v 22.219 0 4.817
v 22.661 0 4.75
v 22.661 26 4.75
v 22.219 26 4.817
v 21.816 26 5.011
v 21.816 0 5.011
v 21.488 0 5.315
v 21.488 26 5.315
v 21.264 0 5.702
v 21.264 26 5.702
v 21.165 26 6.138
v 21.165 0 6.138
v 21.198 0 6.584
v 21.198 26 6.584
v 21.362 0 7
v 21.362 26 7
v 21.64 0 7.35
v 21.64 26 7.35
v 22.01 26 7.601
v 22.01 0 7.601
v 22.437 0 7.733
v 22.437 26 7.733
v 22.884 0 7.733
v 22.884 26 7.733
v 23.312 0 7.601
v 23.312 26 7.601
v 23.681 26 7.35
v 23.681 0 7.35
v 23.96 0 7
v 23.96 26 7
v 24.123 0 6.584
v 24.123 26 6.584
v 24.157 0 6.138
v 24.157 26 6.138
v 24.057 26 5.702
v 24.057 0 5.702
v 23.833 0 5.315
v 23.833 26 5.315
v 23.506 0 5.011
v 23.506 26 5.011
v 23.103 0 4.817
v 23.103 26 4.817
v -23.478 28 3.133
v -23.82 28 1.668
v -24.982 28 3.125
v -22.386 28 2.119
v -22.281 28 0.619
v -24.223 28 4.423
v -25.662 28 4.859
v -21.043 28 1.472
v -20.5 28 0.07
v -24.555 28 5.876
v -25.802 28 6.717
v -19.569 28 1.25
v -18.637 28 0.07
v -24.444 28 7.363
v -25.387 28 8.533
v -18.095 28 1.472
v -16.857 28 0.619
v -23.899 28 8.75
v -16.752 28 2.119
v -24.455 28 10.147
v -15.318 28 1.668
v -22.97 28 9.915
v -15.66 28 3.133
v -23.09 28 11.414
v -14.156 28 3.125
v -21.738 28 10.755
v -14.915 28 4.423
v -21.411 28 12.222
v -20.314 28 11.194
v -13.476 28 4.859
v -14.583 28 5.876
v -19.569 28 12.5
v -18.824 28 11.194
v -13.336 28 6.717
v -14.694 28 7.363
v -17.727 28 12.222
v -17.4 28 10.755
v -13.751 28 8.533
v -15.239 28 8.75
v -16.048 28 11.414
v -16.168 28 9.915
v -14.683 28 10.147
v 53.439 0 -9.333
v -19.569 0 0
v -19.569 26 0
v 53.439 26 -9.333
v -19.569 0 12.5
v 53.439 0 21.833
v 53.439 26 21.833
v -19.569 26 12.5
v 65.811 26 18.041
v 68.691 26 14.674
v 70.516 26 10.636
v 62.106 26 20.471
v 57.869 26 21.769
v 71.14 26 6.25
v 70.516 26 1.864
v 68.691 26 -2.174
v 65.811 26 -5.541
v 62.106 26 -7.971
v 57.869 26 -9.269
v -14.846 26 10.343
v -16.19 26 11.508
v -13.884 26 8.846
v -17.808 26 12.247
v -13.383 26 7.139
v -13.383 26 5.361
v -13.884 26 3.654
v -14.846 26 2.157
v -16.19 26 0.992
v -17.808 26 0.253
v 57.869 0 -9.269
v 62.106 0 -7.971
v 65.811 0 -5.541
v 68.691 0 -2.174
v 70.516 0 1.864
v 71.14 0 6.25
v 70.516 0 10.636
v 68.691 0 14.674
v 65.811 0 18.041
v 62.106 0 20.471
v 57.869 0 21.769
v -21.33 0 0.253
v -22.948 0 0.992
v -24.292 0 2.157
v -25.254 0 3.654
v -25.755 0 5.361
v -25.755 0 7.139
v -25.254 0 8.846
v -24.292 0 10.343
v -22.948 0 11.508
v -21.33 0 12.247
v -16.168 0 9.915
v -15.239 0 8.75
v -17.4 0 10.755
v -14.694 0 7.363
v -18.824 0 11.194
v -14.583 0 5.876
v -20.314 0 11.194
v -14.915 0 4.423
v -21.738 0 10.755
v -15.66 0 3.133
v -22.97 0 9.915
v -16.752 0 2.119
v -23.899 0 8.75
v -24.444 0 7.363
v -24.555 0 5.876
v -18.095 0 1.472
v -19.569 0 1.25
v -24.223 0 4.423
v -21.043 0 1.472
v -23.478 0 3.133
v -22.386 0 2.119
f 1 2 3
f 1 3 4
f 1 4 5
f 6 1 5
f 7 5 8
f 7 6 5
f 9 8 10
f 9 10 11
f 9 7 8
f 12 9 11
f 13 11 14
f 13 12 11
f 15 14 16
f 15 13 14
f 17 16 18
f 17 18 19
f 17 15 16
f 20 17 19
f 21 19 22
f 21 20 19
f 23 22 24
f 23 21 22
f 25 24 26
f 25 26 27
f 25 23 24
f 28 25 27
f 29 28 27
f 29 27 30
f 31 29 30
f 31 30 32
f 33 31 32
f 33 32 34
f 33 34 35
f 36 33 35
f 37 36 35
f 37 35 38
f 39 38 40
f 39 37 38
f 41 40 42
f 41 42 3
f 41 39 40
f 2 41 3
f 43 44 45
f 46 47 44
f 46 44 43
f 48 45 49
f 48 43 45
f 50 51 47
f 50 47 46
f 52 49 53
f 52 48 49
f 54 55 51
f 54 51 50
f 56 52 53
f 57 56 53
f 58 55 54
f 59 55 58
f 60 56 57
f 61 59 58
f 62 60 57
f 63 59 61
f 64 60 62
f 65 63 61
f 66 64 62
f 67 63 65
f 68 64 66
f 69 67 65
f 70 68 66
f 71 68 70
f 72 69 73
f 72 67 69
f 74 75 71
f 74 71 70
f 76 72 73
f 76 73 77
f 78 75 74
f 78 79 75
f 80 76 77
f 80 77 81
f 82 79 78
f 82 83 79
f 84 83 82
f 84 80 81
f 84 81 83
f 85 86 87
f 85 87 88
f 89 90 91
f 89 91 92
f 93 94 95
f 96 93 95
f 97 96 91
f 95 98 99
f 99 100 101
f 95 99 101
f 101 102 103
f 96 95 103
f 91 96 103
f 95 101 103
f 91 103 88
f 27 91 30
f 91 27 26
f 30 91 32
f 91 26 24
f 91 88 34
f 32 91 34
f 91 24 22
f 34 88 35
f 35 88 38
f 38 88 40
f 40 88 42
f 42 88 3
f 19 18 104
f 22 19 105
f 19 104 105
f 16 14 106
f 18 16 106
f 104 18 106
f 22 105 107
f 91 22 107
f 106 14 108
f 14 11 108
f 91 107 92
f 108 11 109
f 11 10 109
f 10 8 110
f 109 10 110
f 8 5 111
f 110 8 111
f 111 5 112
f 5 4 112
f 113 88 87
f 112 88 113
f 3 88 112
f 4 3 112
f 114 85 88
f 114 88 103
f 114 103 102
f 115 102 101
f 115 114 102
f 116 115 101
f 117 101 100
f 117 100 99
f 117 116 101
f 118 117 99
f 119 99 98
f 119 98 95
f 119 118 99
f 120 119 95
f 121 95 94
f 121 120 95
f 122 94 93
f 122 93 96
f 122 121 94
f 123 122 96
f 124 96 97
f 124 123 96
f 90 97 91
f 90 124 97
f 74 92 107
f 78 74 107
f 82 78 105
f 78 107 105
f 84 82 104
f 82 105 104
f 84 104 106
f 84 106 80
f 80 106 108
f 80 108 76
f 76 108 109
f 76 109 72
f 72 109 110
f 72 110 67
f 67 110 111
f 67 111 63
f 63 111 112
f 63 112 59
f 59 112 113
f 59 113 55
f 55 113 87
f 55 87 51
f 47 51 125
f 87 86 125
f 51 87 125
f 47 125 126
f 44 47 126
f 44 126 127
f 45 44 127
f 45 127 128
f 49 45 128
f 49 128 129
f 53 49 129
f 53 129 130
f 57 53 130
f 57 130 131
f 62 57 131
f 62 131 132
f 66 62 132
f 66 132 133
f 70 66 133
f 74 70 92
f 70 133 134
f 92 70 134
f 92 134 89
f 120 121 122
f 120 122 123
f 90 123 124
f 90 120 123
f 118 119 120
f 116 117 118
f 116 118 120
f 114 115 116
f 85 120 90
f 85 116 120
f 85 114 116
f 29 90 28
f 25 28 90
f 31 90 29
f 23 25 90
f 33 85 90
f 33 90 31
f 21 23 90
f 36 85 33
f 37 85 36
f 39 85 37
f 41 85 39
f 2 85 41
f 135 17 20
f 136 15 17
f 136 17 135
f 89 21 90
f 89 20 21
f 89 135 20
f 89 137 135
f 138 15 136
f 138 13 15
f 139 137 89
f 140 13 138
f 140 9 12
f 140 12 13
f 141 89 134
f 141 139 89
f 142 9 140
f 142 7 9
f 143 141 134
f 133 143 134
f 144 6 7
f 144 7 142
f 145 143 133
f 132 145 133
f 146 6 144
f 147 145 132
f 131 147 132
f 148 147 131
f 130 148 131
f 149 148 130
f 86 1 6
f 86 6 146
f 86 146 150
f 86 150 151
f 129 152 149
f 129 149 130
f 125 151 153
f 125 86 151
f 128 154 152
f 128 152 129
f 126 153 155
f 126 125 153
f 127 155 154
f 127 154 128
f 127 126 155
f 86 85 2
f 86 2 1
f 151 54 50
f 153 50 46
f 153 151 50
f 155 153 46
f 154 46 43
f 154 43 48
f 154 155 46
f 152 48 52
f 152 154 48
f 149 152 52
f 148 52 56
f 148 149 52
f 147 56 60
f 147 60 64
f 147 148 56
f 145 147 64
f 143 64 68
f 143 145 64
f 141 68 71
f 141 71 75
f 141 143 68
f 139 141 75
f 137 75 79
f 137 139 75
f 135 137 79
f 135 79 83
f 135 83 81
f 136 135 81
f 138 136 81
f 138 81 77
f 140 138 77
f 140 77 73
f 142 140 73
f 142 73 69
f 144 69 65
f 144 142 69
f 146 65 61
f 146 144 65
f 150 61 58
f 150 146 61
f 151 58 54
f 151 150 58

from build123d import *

# Parameters (mm, degrees)
SKETCH1_R           = 5
SKETCH1_R_2         = 1.5
BOSS_EXTRUDE2_DEPTH = 26
SKETCH2_R           = 6.25
BOSS_EXTRUDE3_DEPTH = 2
CUT_EXTRUDE1_START  = -2
SKETCH3_R           = 5
CUT_EXTRUDE1_DEPTH  = 2


with BuildPart() as part:
    # Sketch1 → Boss-Extrude2 (new body)
    with BuildSketch(Plane(origin=(0, 0, 0), x_dir=(1, 0, 0), z_dir=(0, 1, 0))):
        with BuildLine():
            Line((-19.568980619, 0), (53.439105934, 9.332584612))
            ThreePointArc((53.439105934, 9.332584612), (71.14040073, -6.25), (53.439105934, -21.832584612))
            Line((53.439105934, -21.832584612), (-19.568980619, -12.5))
            ThreePointArc((-19.568980619, -12.5), (-25.818980619, -6.25), (-19.568980619, 0))
        make_face()
        with Locations(Location((-19.568980619, -6.25, 0), (0, 0, 90))):
            Circle(SKETCH1_R, mode=Mode.SUBTRACT)
        with Locations(Location((22.660710056, -6.25, 0), (0, 0, 90))):
            Circle(SKETCH1_R_2, mode=Mode.SUBTRACT)
    extrude(amount=BOSS_EXTRUDE2_DEPTH)

    # Sketch2 → Boss-Extrude3 (add)
    with BuildSketch(Plane(origin=(0, 26, 0), x_dir=(1, 0, 0), z_dir=(0, 1, 0))):
        with Locations(Location((-19.568980619, -6.25, 0), (0, 0, 270))):
            Circle(SKETCH2_R)
    extrude(amount=BOSS_EXTRUDE3_DEPTH)

    # Sketch3 → Cut-Extrude1 (cut)
    with BuildSketch(Plane(origin=(0, 28, 0), x_dir=(1, 0, 0), z_dir=(0, 1, 0)).offset(CUT_EXTRUDE1_START)):
        with Locations(Location((-19.568980619, -6.25, 0), (0, 0, 90))):
            Circle(SKETCH3_R)
    extrude(amount=CUT_EXTRUDE1_DEPTH, mode=Mode.SUBTRACT)


solid = part.part
